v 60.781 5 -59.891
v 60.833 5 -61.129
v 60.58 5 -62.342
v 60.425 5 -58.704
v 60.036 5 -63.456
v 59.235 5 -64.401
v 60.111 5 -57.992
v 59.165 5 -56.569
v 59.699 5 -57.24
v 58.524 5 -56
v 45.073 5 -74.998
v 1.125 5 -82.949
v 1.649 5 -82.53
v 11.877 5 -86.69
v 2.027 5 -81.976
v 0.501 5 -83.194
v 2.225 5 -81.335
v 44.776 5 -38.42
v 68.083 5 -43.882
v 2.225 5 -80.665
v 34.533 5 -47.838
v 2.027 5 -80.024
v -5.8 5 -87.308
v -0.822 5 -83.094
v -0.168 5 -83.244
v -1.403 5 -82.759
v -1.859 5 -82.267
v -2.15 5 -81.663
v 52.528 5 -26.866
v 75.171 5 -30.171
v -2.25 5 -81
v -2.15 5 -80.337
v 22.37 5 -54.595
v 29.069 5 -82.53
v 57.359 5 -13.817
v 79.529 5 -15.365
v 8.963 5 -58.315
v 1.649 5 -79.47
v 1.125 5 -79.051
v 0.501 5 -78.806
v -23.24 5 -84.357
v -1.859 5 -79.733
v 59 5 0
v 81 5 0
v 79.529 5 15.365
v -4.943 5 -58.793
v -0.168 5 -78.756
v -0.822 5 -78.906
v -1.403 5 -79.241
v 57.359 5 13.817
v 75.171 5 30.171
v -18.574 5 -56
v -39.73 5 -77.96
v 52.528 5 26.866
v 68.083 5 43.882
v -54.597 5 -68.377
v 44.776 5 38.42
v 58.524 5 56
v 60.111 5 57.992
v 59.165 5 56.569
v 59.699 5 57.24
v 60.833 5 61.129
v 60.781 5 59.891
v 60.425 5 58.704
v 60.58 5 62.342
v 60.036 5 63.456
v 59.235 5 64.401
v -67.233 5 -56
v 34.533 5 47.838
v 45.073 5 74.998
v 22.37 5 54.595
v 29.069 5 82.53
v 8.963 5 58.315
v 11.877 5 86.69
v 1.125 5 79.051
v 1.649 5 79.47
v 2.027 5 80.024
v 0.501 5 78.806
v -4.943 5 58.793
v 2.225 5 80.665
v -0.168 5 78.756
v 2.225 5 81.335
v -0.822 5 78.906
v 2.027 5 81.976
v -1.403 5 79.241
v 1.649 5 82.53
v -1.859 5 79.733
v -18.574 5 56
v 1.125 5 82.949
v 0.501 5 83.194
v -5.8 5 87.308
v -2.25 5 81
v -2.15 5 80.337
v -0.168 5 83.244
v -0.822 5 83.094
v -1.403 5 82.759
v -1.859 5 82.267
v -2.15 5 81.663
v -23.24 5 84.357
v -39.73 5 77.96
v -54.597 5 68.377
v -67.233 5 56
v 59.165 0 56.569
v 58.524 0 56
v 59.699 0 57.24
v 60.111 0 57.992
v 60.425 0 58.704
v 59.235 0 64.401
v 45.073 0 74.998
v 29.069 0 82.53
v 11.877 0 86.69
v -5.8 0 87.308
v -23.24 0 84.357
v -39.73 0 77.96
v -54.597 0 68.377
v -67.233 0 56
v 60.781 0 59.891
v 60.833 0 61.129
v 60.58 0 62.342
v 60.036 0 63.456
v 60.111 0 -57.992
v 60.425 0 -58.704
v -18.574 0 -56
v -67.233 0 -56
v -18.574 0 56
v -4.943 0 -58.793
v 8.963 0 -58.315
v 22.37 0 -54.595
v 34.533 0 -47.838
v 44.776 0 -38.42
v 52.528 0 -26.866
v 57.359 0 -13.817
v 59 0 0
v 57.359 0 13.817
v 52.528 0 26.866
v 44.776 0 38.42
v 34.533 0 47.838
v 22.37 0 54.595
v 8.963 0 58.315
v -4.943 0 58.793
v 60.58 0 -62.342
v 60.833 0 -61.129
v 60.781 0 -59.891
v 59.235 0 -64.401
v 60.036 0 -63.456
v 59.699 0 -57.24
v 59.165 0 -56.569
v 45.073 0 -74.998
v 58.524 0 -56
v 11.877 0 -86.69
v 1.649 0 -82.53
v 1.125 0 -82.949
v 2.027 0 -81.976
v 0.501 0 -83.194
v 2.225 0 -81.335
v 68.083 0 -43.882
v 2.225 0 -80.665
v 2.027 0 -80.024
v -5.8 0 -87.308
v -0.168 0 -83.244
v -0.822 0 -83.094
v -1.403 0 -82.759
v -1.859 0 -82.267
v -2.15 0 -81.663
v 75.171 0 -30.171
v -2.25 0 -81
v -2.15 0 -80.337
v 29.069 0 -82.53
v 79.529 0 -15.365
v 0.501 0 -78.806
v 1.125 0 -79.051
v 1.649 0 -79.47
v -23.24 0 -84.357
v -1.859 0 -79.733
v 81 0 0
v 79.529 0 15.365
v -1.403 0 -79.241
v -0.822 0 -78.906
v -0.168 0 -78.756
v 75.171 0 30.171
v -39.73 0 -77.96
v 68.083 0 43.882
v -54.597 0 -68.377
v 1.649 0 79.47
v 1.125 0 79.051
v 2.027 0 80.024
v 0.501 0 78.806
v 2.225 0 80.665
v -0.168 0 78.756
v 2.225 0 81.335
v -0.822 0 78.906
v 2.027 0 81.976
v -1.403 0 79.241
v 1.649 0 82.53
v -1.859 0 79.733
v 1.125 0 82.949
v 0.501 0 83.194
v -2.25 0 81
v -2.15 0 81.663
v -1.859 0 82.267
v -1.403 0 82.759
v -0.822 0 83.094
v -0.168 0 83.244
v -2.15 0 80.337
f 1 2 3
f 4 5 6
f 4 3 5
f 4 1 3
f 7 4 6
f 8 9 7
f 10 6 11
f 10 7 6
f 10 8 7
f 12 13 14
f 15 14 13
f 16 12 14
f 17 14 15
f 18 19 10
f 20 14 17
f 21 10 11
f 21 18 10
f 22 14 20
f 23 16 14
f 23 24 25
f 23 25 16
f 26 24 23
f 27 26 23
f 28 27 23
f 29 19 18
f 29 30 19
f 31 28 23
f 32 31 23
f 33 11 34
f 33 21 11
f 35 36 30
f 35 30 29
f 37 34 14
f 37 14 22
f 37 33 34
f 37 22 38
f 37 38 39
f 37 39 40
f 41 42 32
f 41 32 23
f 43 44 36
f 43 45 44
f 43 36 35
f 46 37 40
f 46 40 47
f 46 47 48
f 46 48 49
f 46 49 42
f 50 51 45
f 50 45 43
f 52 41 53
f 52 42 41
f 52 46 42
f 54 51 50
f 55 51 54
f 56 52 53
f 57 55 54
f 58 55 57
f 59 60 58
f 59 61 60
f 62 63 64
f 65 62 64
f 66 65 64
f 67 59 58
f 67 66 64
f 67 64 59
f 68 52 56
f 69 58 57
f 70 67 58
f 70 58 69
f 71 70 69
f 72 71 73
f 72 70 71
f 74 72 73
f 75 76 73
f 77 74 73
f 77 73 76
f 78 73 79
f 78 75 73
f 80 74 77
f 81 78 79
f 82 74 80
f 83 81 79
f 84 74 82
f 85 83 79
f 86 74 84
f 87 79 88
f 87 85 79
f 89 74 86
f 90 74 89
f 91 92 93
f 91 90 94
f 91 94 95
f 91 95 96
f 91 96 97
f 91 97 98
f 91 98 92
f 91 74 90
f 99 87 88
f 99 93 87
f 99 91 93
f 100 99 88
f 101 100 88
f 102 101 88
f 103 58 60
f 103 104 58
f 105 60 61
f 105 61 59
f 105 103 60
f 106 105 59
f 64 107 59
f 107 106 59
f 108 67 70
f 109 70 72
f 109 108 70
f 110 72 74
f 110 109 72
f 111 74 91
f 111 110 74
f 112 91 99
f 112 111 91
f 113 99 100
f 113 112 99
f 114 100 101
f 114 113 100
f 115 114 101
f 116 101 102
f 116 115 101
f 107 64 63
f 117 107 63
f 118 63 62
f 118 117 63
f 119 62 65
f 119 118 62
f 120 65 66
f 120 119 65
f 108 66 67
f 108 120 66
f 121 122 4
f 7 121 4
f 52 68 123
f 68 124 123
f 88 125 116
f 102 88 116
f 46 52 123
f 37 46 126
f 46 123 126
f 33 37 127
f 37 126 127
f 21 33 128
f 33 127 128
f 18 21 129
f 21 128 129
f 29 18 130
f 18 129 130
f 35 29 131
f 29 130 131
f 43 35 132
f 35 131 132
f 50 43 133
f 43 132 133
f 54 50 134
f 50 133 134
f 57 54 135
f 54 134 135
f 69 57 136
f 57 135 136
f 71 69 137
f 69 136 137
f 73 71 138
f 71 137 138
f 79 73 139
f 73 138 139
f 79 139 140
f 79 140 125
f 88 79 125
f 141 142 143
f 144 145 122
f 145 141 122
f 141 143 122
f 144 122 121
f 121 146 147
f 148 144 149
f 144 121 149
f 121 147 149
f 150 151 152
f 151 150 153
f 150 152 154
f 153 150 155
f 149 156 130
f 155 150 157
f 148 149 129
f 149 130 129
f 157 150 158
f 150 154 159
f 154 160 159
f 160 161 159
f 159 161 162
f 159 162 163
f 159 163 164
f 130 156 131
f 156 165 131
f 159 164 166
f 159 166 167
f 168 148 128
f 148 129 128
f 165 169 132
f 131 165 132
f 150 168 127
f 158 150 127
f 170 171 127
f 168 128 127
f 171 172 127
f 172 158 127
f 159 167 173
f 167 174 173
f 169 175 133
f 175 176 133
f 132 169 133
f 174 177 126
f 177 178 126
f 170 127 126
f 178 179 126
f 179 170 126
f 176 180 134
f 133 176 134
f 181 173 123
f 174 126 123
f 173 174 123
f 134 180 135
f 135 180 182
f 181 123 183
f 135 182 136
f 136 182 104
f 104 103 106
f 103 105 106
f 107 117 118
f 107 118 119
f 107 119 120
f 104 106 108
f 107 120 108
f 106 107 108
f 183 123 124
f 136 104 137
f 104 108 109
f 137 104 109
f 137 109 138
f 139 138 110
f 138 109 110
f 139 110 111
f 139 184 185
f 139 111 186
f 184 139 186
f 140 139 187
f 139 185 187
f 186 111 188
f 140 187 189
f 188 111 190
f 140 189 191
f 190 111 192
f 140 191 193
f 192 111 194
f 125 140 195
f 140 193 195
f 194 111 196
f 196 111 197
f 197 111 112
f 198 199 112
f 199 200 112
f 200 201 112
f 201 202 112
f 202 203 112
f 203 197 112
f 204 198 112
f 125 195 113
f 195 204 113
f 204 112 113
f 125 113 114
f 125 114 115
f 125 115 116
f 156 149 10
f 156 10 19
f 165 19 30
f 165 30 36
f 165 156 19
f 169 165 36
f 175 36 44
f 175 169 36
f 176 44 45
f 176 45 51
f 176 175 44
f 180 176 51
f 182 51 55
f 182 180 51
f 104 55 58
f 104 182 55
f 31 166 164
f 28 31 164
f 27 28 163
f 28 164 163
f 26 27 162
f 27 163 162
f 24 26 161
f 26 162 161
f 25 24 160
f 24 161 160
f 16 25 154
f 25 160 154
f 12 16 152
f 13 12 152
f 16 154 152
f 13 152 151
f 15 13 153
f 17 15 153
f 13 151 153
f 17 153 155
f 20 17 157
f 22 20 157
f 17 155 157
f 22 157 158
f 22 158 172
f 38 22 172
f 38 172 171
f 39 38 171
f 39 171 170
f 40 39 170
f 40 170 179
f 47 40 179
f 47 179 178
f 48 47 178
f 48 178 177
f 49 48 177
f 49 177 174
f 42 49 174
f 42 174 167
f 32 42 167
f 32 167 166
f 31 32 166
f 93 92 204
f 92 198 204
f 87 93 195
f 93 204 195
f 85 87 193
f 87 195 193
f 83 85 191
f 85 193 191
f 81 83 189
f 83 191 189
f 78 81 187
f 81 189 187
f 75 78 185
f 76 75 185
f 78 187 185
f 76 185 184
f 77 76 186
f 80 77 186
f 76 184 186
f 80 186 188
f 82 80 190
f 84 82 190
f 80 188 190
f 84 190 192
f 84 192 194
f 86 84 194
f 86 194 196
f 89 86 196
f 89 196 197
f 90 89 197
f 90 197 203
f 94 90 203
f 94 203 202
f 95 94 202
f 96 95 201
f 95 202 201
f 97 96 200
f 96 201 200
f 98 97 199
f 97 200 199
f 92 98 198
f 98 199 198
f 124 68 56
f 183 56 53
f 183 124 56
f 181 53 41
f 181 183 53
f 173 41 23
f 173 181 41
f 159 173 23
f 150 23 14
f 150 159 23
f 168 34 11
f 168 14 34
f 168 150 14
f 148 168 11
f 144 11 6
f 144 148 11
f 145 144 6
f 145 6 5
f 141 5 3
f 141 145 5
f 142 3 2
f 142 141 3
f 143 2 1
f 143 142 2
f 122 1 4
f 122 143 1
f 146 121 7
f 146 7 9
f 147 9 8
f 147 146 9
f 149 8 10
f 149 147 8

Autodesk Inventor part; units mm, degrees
ref_plane "YZ Plane" through (0, 0, 0) normal (1, 0, 0) x (0, 1, 0)
ref_plane "XZ Plane" through (0, 0, 0) normal (0, 1, 0) x (-1, 0, 0)
ref_plane "XY Plane" through (0, 0, 0) normal (0, 0, 1) x (1, 0, 0)
sketch "Sketch1" plane through (0, 0, 0) normal (0, 1, 0) x (-1, 0, 0)
  circle A0 centre (0, 0) radius 59
  circle A1 centre (0, 0) radius 81
  circle A2 centre (0, 0) radius 87.5
  circle A3 centre (0, 81) radius 2.25
  circle A4 centre (0, -81) radius 2.25
  line L0 (90, -56) -> (15, -56)
  line L1 (10, -51) -> (10, 51)
  line L2 (15, 56) -> (90, 56)
  line L3 (90, 56) -> (90, -56)
  line L4 (90, -56) -> (10, 56) construction
  line L5 (10, -56) -> (90, 56) construction
  arc A5 (10, -51) -> (15, -56) centre (15, -51) ccw
  arc A6 (15, 56) -> (10, 51) centre (15, 51) ccw
  line L6 (0, 103.0841) -> (0, -103.0841)
  line L7 (-90, -56) -> (-15, -56)
  line L8 (-10, -51) -> (-10, 51)
  line L9 (-15, 56) -> (-90, 56)
  line L10 (-90, 56) -> (-90, -56)
  arc A7 (-15, -56) -> (-10, -51) centre (-15, -51) ccw
  arc A8 (-10, 51) -> (-15, 56) centre (-15, 51) ccw
  point P0 (50, 0)
  point P1 (90, 0)
  point P2 (10, 0)
  point P3 (56.2614, -45.3902)
  point P4 (56.2614, 63.4399)
  point P5 (76.2614, 44.4685)
  point P6 (76.2614, -26.4188)
  point P7 (63.4942, 65.0248)
  point P8 (63.4942, -46.9752)
  point P9 (18.5742, -56)
  point P10 (18.5742, 56)
  point P11 (67.2328, 56)
  point P12 (-67.2328, 56)
  point P13 (-58.5235, 56)
  point P14 (-58.5235, -56)
  point P15 (-67.2328, -56)
  point P16 (67.2328, -56)
  dimension "d0" = 118
  dimension "d1" = 162
  dimension "d2" = 175
  dimension "d3" = 4.5
  dimension "d4" = 4.5
  dimension "d5" = 112
  dimension "d6" = 80
  dimension "d7" = 10
  dimension "d8" = 5
  dimension "d9" = 0
  dimension "d10" = 0
  dimension "d11" = 56
extrude "Extrusion1" add sketch "Sketch1" along normal blind 5 contours A0 L6 A3 A1 L2 | L0 A1 A4 L6 A0 | A0 L9 A1 A3 L6 | A1 A3 L6 A2 L2 | L6 A4 A1 L7 A0 | L0 A2 L6 A4 A1 | A0 L7 A1 L9 | L9 A2 L6 A3 A1 | A1 A4 L6 A2 L7
chamfer "Chamfer1" distance 8 angle 45 2 edges at (67.2328, 2.5, 56) (67.2328, 2.5, -56)
fillet "Fillet1" radius 5 4 edges at (61.8372, 2.5, -61.9065) (59.2328, 2.5, 56) (61.8372, 2.5, 61.9065) (59.2328, 2.5, -56)
equation "\"d11\" = 0.5 * d5"
properties part number "Cylinder Segment Holder Both Cameras"
